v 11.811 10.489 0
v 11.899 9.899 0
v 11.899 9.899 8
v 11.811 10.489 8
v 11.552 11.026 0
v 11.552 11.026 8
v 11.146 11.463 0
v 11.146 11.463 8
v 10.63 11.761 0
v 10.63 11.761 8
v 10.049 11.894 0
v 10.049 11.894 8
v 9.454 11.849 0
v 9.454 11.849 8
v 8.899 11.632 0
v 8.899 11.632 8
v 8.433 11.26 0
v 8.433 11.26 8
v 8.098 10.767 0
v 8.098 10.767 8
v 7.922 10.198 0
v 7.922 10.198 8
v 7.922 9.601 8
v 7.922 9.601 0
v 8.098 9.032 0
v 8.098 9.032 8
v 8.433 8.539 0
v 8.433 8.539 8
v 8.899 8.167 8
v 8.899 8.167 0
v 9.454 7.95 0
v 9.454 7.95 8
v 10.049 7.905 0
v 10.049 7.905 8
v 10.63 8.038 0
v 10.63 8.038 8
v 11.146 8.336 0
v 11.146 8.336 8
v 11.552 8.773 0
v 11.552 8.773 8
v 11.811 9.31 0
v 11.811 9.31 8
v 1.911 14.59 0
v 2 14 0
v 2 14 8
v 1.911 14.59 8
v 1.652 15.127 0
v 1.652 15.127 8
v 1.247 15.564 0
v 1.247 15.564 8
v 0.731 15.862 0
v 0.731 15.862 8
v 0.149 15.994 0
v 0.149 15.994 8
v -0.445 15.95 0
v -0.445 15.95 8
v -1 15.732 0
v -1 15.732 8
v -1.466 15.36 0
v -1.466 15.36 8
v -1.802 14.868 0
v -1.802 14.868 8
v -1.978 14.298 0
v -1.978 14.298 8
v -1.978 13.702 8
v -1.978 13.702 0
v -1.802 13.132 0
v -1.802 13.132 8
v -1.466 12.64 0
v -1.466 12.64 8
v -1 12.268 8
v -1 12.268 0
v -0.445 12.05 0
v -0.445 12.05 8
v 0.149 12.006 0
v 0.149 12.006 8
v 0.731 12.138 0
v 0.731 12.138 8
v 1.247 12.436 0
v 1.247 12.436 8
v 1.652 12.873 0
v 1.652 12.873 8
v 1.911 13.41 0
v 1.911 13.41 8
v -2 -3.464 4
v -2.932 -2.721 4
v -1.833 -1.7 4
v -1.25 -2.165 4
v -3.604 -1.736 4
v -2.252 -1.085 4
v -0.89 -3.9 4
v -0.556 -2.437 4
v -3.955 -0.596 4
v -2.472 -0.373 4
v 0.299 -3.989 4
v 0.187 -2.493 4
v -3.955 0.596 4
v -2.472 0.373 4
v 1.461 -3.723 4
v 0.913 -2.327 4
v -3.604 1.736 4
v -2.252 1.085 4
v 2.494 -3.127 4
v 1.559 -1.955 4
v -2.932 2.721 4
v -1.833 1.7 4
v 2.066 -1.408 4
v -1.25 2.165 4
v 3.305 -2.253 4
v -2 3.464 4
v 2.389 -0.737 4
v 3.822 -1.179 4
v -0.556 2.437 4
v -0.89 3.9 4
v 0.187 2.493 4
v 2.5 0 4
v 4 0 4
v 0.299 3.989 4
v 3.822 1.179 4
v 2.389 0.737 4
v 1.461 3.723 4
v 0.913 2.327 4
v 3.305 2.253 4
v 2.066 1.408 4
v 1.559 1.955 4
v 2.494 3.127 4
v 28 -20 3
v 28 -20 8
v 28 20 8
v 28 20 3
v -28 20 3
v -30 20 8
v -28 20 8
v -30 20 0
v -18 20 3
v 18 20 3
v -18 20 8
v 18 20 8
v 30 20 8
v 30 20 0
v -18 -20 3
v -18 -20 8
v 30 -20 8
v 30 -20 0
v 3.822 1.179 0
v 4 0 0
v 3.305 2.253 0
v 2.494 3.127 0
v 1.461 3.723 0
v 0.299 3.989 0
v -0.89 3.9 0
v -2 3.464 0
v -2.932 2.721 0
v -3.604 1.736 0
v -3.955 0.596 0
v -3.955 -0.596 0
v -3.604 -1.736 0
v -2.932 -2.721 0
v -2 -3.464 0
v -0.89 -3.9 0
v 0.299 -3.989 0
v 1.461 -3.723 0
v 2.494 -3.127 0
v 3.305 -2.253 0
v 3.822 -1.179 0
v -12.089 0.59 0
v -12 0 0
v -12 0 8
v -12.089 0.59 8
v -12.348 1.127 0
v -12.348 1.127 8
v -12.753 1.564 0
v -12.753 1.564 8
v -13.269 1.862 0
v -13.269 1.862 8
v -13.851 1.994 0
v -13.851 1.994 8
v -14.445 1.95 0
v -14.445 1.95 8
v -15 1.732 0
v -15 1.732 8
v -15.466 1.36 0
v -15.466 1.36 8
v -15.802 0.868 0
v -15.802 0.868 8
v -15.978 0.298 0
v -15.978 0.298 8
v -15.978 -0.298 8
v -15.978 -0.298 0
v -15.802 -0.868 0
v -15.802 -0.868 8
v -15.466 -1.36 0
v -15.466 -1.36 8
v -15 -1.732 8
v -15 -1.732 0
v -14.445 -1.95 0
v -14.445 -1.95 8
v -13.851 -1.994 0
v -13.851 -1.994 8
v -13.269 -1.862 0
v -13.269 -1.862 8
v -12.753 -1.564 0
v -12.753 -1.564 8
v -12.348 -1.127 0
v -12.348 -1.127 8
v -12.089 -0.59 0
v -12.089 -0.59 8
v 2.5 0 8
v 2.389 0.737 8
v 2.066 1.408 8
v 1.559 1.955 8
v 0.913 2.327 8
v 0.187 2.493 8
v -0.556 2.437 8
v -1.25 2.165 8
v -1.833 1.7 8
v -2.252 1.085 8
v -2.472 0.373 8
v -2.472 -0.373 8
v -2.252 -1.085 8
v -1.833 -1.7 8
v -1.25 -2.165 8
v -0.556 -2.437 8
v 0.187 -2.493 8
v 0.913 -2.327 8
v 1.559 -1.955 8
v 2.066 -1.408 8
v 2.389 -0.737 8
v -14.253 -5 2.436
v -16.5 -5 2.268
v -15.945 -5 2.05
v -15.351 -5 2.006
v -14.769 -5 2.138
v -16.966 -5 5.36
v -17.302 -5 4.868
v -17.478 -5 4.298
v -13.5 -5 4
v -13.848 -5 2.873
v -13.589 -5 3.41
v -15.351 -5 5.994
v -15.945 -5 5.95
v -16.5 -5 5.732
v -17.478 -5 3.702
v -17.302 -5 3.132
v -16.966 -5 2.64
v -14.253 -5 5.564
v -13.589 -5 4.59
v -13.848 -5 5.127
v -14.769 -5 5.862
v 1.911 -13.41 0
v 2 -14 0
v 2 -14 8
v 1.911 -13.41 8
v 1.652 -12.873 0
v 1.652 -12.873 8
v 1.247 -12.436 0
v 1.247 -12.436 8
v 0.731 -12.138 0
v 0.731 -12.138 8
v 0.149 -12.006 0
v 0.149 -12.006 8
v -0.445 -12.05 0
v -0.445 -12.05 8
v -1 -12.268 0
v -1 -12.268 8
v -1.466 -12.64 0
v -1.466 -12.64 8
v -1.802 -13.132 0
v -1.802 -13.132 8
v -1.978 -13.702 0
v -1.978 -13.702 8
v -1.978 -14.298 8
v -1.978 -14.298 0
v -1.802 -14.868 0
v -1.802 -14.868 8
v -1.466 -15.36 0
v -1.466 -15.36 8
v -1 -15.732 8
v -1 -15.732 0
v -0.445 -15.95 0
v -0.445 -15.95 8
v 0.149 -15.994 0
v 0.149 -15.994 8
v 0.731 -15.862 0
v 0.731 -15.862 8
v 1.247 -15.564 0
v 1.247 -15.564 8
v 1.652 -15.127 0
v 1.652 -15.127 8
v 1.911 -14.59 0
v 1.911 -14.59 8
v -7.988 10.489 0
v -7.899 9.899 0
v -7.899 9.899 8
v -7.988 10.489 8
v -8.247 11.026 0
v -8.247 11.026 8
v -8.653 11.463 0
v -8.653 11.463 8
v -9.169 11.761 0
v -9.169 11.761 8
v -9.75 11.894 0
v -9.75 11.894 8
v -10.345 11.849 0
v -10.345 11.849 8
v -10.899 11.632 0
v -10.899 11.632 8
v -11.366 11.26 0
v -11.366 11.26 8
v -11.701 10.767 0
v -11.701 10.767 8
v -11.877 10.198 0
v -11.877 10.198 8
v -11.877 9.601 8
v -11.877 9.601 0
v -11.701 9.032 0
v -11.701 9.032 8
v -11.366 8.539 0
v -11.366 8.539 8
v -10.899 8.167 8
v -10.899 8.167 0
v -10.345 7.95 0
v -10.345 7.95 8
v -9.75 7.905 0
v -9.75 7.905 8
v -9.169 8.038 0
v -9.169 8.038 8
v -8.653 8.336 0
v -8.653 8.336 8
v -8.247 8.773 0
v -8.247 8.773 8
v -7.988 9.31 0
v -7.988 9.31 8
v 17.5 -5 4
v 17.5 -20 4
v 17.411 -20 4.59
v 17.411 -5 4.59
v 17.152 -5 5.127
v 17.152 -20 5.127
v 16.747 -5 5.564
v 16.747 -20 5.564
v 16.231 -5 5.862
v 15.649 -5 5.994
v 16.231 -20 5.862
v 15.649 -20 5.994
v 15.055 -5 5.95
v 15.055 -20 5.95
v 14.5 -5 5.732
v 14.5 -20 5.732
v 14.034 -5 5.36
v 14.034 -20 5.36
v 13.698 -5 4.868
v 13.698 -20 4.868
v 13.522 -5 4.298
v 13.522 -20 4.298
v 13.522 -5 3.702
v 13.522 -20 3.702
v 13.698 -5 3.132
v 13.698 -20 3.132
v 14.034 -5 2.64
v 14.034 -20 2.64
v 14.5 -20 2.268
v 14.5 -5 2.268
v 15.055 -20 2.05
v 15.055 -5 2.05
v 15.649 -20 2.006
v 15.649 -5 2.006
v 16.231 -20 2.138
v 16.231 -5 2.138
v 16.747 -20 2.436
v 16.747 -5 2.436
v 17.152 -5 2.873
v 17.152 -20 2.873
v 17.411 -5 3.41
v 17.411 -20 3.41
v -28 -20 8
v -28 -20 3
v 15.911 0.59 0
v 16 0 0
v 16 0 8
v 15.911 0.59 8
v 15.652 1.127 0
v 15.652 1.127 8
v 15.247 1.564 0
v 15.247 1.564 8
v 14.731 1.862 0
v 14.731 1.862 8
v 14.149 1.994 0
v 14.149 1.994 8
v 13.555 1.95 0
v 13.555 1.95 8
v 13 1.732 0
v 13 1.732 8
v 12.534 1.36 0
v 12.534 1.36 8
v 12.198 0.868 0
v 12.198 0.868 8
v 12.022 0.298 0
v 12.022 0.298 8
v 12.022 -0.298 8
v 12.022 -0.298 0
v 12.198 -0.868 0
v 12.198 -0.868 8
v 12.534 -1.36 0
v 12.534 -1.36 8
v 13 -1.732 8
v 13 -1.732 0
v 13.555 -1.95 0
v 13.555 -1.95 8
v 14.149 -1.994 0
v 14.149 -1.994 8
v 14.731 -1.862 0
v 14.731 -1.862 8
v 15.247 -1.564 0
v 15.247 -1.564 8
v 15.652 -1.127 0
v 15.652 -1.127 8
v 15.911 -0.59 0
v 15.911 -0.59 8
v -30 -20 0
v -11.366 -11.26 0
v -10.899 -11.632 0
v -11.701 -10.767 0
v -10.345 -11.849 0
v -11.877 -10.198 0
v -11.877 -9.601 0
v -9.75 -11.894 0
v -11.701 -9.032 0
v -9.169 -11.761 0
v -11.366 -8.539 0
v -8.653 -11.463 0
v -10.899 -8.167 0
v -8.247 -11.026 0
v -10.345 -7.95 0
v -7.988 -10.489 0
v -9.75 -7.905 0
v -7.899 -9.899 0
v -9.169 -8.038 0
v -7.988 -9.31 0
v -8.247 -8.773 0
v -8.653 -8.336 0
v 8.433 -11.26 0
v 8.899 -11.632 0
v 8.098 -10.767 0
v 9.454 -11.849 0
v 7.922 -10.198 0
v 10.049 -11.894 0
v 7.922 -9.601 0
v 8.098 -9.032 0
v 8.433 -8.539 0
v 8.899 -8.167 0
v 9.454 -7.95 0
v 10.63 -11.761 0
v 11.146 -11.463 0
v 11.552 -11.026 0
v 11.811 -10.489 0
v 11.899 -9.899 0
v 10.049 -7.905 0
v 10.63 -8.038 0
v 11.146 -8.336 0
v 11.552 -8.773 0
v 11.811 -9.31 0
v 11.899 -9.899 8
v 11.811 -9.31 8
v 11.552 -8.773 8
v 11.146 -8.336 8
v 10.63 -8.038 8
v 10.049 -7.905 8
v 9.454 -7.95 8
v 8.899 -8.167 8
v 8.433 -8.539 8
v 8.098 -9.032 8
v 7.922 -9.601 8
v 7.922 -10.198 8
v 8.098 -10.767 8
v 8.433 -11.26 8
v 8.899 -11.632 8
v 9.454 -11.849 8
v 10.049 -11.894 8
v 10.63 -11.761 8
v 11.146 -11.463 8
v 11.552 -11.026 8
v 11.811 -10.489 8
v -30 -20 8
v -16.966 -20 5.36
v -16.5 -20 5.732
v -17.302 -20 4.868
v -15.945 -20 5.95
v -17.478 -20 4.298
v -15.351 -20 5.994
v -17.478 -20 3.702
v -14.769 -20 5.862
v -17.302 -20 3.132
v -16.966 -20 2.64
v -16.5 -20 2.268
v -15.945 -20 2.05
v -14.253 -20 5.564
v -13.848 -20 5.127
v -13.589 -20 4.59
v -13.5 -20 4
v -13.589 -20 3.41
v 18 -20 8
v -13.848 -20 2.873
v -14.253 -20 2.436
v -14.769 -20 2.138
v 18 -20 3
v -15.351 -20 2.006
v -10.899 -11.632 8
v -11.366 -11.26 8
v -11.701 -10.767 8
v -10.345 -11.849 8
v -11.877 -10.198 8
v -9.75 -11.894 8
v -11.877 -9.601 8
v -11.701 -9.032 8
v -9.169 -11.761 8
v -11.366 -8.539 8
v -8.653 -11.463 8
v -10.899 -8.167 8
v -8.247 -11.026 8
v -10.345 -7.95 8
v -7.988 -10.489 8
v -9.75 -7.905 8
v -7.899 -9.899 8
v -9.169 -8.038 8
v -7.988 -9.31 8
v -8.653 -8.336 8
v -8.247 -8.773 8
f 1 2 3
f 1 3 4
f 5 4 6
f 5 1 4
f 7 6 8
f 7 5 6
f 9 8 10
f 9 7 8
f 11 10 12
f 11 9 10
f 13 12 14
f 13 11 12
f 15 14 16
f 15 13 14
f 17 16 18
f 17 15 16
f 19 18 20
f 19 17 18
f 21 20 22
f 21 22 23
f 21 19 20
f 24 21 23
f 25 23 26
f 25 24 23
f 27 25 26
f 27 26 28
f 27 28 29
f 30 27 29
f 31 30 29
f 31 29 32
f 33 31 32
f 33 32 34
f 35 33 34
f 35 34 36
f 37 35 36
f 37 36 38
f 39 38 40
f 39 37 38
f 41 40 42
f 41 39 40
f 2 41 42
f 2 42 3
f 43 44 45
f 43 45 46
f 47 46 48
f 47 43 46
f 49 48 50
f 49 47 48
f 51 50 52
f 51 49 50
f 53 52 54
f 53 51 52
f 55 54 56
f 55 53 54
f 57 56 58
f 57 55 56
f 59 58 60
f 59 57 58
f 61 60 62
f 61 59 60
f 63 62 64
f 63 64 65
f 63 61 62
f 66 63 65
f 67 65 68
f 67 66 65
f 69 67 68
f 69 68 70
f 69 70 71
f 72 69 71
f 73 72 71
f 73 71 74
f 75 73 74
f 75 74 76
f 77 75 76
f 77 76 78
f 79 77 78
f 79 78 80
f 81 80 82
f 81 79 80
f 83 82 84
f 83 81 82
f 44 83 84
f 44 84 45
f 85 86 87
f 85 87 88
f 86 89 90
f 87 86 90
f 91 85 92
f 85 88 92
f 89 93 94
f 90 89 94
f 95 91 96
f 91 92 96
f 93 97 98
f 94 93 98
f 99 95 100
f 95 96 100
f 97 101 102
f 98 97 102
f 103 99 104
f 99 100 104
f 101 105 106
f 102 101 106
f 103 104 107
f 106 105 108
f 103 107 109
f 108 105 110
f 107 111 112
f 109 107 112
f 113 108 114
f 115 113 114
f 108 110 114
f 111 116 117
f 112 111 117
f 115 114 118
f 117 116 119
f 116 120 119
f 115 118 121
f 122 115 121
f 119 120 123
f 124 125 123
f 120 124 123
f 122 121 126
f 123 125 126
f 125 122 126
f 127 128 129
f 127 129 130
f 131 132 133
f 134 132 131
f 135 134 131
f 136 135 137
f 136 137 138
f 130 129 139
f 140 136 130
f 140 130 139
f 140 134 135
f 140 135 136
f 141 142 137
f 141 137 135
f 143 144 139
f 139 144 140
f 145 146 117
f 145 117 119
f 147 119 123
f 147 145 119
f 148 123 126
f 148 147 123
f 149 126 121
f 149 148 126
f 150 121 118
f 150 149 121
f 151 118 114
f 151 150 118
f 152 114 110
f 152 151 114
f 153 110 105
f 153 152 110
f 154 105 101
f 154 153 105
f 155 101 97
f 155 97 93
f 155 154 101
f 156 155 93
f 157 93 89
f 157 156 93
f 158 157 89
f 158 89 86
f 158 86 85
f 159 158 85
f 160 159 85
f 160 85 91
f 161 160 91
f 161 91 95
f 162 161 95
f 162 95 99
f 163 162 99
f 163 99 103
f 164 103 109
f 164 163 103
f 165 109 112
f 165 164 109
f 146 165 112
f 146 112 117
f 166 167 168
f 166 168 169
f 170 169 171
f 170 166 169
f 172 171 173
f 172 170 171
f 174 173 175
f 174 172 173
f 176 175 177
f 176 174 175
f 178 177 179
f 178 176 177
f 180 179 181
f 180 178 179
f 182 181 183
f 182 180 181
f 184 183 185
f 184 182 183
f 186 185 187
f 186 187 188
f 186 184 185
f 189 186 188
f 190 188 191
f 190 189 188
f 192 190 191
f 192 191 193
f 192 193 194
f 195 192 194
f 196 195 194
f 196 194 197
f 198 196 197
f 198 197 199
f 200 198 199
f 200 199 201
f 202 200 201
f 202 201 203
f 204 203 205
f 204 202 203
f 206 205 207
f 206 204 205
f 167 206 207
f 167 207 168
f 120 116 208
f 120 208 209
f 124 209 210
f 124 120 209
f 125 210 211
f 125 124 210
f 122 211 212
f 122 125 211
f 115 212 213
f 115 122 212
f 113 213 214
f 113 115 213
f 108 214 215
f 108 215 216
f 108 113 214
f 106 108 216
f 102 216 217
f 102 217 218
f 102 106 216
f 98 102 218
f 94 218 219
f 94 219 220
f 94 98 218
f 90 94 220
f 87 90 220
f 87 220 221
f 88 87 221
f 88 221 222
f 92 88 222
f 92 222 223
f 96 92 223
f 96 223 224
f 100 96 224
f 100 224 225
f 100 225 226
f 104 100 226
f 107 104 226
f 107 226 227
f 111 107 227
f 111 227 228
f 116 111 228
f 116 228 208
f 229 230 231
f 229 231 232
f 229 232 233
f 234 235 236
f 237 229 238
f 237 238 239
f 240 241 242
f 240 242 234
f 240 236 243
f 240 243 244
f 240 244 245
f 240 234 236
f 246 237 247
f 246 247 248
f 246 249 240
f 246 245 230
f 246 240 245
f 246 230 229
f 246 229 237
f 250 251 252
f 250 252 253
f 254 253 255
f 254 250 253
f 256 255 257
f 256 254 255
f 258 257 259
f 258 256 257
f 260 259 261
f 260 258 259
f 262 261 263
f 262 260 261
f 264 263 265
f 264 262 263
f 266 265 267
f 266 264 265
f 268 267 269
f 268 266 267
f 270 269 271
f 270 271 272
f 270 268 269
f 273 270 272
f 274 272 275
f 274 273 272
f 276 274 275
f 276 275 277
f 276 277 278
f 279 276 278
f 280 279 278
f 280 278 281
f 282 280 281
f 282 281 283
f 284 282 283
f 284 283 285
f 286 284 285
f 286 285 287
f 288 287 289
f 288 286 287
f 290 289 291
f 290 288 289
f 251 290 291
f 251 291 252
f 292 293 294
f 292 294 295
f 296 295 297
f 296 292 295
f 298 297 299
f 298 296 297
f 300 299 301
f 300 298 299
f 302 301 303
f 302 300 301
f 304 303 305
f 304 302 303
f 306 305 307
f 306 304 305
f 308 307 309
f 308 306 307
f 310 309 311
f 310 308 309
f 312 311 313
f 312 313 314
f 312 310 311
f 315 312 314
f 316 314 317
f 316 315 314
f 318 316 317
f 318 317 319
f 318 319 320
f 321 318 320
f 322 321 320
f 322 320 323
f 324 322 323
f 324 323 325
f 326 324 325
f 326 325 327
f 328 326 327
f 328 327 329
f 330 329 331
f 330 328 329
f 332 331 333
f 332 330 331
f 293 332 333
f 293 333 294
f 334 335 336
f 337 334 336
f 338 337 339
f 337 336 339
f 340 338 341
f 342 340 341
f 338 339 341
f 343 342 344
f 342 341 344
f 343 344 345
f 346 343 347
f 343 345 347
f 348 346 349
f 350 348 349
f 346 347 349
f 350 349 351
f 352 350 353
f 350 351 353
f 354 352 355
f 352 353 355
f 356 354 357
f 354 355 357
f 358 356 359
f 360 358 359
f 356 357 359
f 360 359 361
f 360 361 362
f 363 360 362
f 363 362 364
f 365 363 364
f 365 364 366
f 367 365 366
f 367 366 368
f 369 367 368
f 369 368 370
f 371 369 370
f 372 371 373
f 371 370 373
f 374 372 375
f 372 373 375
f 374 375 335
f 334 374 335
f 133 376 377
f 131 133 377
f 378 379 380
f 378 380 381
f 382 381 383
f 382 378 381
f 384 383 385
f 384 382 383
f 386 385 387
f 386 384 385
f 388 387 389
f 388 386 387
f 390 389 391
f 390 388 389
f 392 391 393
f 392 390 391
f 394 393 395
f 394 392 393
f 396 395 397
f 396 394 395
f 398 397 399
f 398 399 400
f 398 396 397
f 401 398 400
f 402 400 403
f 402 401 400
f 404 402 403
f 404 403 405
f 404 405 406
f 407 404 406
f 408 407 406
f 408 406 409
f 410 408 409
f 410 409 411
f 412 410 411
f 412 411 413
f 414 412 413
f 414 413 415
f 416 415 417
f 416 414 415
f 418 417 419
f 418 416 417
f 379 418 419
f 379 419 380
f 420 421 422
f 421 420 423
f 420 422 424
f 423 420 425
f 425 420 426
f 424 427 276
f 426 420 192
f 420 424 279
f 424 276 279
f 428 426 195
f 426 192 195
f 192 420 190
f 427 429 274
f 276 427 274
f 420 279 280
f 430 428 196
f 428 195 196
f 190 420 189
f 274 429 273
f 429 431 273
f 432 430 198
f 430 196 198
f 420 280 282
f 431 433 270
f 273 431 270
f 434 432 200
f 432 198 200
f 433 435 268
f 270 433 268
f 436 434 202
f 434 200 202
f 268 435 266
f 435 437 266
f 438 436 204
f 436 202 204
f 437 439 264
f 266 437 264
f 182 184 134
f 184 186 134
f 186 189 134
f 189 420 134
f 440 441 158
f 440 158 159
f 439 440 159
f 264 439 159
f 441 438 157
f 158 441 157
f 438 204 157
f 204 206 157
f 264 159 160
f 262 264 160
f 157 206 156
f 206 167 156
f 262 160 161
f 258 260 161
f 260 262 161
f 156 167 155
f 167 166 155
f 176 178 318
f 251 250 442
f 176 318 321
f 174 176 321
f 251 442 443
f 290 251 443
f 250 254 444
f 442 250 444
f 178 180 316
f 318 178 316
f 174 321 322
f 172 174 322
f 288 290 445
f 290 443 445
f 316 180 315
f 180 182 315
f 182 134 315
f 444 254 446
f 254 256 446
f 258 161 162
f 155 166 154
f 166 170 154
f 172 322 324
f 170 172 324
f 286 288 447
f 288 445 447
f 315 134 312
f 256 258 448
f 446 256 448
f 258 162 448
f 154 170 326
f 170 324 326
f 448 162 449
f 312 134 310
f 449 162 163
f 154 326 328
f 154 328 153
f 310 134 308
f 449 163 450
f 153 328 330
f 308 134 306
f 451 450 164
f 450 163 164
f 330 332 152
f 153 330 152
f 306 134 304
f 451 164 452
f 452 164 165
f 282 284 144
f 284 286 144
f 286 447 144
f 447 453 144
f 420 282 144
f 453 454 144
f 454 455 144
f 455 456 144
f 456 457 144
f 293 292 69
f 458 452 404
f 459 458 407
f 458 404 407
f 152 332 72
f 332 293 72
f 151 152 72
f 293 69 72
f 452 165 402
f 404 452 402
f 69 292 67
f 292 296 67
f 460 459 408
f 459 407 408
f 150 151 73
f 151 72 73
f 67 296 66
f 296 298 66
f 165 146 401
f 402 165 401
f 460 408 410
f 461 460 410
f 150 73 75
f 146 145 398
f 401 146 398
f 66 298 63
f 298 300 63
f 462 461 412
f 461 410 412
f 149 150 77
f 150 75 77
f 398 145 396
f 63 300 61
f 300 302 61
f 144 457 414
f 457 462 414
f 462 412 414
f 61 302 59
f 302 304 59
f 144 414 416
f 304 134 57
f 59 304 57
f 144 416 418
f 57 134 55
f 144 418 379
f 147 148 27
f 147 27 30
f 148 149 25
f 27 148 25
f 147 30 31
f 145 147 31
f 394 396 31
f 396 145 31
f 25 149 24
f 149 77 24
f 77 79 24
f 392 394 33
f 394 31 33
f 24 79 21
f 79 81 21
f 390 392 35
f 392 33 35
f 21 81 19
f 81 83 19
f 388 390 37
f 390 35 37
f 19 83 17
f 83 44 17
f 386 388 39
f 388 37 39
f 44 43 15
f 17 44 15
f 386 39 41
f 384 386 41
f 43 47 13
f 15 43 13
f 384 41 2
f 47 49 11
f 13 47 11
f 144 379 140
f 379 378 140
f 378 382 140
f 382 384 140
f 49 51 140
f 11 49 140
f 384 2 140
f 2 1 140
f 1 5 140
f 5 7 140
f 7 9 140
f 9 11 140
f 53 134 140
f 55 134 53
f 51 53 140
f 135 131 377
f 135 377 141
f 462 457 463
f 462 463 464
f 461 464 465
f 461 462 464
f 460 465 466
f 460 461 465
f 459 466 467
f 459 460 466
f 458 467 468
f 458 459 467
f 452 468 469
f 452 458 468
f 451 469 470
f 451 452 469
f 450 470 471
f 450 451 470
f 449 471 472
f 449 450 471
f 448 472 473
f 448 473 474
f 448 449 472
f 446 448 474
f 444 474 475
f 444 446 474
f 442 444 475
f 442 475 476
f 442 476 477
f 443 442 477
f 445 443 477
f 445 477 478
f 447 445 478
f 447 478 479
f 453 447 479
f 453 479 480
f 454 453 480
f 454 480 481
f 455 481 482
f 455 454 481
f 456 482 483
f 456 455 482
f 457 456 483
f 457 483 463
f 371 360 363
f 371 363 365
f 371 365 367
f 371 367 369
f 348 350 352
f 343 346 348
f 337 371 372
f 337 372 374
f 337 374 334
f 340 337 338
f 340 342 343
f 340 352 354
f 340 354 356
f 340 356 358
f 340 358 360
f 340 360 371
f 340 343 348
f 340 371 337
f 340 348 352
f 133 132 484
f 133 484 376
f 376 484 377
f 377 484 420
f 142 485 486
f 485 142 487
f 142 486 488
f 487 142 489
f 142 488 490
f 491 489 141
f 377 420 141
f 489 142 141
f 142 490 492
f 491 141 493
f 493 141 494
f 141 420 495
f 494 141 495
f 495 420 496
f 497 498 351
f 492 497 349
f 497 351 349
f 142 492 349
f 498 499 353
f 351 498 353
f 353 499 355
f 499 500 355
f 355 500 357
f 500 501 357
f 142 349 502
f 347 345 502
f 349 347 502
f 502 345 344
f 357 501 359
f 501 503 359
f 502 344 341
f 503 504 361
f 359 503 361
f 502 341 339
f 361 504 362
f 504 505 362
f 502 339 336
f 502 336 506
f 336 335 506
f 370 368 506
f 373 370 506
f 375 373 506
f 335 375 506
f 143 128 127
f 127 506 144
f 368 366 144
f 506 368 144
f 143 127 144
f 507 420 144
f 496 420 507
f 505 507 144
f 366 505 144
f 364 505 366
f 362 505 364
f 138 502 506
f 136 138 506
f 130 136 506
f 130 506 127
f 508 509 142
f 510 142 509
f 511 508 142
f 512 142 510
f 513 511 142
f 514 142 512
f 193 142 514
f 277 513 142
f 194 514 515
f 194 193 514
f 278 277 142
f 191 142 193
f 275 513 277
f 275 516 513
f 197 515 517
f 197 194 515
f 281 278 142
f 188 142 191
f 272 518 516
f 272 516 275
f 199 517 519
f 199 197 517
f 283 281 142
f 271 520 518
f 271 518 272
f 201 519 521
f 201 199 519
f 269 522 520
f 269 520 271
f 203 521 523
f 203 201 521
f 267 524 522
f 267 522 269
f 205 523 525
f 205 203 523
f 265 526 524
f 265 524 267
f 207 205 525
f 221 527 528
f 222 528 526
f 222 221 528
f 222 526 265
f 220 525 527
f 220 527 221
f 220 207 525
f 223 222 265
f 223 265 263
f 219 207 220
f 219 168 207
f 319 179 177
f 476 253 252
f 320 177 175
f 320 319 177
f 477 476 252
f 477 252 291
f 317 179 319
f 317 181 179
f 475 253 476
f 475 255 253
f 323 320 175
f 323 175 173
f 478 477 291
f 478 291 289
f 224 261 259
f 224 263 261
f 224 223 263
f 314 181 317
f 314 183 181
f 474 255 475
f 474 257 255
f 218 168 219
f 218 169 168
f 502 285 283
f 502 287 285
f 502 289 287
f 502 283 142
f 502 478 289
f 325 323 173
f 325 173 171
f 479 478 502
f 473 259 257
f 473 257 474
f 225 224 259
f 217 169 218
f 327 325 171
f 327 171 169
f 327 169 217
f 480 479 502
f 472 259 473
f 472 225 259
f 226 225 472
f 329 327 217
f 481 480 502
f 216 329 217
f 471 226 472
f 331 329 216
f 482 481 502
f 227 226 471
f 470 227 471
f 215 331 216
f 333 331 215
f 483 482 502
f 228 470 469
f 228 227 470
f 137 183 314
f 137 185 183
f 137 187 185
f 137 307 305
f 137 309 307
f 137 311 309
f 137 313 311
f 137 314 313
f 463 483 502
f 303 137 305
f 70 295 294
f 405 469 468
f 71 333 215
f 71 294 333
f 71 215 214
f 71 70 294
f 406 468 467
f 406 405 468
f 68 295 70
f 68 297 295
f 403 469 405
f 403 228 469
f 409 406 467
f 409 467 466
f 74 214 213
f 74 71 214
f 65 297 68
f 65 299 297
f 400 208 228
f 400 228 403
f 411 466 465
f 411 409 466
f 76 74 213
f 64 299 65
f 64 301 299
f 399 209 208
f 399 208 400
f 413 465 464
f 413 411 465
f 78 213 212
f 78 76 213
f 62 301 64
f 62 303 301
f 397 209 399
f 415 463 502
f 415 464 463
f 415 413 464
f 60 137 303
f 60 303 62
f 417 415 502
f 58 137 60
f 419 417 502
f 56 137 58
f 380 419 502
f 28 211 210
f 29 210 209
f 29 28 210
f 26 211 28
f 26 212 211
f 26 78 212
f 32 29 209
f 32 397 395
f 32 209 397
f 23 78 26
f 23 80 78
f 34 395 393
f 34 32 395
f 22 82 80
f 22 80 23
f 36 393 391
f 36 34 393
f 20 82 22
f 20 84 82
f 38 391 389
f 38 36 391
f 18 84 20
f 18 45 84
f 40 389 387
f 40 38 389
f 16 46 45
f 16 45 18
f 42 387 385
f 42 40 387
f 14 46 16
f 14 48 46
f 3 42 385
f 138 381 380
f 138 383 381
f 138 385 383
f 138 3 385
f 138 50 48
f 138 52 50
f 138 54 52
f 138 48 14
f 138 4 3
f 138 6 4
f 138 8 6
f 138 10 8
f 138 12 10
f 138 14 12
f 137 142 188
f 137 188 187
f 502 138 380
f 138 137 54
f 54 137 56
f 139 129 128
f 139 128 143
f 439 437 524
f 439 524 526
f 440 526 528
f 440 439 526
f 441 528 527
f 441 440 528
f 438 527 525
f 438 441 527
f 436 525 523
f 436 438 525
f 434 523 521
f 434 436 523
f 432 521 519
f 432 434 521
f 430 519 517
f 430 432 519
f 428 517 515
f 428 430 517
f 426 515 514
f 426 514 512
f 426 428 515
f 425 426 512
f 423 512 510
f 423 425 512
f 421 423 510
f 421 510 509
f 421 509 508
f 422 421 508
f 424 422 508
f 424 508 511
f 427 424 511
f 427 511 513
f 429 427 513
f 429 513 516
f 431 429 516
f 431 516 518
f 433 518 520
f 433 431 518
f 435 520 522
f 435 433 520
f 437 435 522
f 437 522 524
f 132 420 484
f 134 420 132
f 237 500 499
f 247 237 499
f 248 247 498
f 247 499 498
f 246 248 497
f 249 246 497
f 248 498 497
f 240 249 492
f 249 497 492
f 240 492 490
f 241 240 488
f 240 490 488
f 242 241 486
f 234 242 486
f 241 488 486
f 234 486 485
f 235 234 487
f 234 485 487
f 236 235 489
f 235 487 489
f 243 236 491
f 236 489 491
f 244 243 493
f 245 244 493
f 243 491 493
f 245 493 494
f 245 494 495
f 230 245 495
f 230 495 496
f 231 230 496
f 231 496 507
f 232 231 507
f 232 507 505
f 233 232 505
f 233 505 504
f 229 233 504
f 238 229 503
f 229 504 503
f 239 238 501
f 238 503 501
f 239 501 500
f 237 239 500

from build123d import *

# Parameters (mm, degrees)
ESQUISSE1_W      = 60
ESQUISSE1_H      = 40
ESQUISSE1_R      = 2.5
ESQUISSE1_R_2    = 2
EXTRUSION1_DEPTH = 8
ESQUISSE2_R      = 4
EXTRUSION2_DEPTH = 4
ESQUISSE3_R      = 2
EXTRUSION3_DEPTH = 15
ESQUISSE4_W      = 10
ESQUISSE4_H      = 5
EXTRUSION4_DEPTH = 41


with BuildPart() as part:
    # Esquisse1 → Extrusion1 (new body)
    with BuildSketch(Plane.XY):
        Rectangle(ESQUISSE1_W, ESQUISSE1_H)
        Circle(ESQUISSE1_R, mode=Mode.SUBTRACT)
        with Locations((9.899494937, 9.899494937)):
            Circle(ESQUISSE1_R_2, mode=Mode.SUBTRACT)
        with Locations((0, 14)):
            Circle(ESQUISSE1_R_2, mode=Mode.SUBTRACT)
        with Locations((14, 0)):
            Circle(ESQUISSE1_R_2, mode=Mode.SUBTRACT)
        with Locations((9.899494937, -9.899494937)):
            Circle(ESQUISSE1_R_2, mode=Mode.SUBTRACT)
        with Locations((0, -14)):
            Circle(ESQUISSE1_R_2, mode=Mode.SUBTRACT)
        with Locations((-9.899494937, -9.899494937)):
            Circle(ESQUISSE1_R_2, mode=Mode.SUBTRACT)
        with Locations((-14, 0)):
            Circle(ESQUISSE1_R_2, mode=Mode.SUBTRACT)
        with Locations((-9.899494937, 9.899494937)):
            Circle(ESQUISSE1_R_2, mode=Mode.SUBTRACT)
    extrude(amount=EXTRUSION1_DEPTH)

    # Esquisse2 → Extrusion2 (cut)
    with BuildSketch(Plane.XY):
        Circle(ESQUISSE2_R)
    extrude(amount=EXTRUSION2_DEPTH, mode=Mode.SUBTRACT)

    # Esquisse3 → Extrusion3 (cut)
    with BuildSketch(Plane.XZ.offset(20)):
        with Locations((-15.5, 4)):
            Circle(ESQUISSE3_R)
        with Locations((15.5, 4)):
            Circle(ESQUISSE3_R)
    extrude(amount=-EXTRUSION3_DEPTH, mode=Mode.SUBTRACT)

    # Esquisse4 → Extrusion4 (cut, through all)
    with BuildSketch(Plane(origin=(0, 20, 0), x_dir=(1, 0, 0), z_dir=(0, 1, 0))):
        with Locations((-23, -5.5)):
            Rectangle(ESQUISSE4_W, ESQUISSE4_H)
        with Locations((23, -5.5)):
            Rectangle(ESQUISSE4_W, ESQUISSE4_H)
    extrude(amount=-EXTRUSION4_DEPTH, mode=Mode.SUBTRACT)


solid = part.part
